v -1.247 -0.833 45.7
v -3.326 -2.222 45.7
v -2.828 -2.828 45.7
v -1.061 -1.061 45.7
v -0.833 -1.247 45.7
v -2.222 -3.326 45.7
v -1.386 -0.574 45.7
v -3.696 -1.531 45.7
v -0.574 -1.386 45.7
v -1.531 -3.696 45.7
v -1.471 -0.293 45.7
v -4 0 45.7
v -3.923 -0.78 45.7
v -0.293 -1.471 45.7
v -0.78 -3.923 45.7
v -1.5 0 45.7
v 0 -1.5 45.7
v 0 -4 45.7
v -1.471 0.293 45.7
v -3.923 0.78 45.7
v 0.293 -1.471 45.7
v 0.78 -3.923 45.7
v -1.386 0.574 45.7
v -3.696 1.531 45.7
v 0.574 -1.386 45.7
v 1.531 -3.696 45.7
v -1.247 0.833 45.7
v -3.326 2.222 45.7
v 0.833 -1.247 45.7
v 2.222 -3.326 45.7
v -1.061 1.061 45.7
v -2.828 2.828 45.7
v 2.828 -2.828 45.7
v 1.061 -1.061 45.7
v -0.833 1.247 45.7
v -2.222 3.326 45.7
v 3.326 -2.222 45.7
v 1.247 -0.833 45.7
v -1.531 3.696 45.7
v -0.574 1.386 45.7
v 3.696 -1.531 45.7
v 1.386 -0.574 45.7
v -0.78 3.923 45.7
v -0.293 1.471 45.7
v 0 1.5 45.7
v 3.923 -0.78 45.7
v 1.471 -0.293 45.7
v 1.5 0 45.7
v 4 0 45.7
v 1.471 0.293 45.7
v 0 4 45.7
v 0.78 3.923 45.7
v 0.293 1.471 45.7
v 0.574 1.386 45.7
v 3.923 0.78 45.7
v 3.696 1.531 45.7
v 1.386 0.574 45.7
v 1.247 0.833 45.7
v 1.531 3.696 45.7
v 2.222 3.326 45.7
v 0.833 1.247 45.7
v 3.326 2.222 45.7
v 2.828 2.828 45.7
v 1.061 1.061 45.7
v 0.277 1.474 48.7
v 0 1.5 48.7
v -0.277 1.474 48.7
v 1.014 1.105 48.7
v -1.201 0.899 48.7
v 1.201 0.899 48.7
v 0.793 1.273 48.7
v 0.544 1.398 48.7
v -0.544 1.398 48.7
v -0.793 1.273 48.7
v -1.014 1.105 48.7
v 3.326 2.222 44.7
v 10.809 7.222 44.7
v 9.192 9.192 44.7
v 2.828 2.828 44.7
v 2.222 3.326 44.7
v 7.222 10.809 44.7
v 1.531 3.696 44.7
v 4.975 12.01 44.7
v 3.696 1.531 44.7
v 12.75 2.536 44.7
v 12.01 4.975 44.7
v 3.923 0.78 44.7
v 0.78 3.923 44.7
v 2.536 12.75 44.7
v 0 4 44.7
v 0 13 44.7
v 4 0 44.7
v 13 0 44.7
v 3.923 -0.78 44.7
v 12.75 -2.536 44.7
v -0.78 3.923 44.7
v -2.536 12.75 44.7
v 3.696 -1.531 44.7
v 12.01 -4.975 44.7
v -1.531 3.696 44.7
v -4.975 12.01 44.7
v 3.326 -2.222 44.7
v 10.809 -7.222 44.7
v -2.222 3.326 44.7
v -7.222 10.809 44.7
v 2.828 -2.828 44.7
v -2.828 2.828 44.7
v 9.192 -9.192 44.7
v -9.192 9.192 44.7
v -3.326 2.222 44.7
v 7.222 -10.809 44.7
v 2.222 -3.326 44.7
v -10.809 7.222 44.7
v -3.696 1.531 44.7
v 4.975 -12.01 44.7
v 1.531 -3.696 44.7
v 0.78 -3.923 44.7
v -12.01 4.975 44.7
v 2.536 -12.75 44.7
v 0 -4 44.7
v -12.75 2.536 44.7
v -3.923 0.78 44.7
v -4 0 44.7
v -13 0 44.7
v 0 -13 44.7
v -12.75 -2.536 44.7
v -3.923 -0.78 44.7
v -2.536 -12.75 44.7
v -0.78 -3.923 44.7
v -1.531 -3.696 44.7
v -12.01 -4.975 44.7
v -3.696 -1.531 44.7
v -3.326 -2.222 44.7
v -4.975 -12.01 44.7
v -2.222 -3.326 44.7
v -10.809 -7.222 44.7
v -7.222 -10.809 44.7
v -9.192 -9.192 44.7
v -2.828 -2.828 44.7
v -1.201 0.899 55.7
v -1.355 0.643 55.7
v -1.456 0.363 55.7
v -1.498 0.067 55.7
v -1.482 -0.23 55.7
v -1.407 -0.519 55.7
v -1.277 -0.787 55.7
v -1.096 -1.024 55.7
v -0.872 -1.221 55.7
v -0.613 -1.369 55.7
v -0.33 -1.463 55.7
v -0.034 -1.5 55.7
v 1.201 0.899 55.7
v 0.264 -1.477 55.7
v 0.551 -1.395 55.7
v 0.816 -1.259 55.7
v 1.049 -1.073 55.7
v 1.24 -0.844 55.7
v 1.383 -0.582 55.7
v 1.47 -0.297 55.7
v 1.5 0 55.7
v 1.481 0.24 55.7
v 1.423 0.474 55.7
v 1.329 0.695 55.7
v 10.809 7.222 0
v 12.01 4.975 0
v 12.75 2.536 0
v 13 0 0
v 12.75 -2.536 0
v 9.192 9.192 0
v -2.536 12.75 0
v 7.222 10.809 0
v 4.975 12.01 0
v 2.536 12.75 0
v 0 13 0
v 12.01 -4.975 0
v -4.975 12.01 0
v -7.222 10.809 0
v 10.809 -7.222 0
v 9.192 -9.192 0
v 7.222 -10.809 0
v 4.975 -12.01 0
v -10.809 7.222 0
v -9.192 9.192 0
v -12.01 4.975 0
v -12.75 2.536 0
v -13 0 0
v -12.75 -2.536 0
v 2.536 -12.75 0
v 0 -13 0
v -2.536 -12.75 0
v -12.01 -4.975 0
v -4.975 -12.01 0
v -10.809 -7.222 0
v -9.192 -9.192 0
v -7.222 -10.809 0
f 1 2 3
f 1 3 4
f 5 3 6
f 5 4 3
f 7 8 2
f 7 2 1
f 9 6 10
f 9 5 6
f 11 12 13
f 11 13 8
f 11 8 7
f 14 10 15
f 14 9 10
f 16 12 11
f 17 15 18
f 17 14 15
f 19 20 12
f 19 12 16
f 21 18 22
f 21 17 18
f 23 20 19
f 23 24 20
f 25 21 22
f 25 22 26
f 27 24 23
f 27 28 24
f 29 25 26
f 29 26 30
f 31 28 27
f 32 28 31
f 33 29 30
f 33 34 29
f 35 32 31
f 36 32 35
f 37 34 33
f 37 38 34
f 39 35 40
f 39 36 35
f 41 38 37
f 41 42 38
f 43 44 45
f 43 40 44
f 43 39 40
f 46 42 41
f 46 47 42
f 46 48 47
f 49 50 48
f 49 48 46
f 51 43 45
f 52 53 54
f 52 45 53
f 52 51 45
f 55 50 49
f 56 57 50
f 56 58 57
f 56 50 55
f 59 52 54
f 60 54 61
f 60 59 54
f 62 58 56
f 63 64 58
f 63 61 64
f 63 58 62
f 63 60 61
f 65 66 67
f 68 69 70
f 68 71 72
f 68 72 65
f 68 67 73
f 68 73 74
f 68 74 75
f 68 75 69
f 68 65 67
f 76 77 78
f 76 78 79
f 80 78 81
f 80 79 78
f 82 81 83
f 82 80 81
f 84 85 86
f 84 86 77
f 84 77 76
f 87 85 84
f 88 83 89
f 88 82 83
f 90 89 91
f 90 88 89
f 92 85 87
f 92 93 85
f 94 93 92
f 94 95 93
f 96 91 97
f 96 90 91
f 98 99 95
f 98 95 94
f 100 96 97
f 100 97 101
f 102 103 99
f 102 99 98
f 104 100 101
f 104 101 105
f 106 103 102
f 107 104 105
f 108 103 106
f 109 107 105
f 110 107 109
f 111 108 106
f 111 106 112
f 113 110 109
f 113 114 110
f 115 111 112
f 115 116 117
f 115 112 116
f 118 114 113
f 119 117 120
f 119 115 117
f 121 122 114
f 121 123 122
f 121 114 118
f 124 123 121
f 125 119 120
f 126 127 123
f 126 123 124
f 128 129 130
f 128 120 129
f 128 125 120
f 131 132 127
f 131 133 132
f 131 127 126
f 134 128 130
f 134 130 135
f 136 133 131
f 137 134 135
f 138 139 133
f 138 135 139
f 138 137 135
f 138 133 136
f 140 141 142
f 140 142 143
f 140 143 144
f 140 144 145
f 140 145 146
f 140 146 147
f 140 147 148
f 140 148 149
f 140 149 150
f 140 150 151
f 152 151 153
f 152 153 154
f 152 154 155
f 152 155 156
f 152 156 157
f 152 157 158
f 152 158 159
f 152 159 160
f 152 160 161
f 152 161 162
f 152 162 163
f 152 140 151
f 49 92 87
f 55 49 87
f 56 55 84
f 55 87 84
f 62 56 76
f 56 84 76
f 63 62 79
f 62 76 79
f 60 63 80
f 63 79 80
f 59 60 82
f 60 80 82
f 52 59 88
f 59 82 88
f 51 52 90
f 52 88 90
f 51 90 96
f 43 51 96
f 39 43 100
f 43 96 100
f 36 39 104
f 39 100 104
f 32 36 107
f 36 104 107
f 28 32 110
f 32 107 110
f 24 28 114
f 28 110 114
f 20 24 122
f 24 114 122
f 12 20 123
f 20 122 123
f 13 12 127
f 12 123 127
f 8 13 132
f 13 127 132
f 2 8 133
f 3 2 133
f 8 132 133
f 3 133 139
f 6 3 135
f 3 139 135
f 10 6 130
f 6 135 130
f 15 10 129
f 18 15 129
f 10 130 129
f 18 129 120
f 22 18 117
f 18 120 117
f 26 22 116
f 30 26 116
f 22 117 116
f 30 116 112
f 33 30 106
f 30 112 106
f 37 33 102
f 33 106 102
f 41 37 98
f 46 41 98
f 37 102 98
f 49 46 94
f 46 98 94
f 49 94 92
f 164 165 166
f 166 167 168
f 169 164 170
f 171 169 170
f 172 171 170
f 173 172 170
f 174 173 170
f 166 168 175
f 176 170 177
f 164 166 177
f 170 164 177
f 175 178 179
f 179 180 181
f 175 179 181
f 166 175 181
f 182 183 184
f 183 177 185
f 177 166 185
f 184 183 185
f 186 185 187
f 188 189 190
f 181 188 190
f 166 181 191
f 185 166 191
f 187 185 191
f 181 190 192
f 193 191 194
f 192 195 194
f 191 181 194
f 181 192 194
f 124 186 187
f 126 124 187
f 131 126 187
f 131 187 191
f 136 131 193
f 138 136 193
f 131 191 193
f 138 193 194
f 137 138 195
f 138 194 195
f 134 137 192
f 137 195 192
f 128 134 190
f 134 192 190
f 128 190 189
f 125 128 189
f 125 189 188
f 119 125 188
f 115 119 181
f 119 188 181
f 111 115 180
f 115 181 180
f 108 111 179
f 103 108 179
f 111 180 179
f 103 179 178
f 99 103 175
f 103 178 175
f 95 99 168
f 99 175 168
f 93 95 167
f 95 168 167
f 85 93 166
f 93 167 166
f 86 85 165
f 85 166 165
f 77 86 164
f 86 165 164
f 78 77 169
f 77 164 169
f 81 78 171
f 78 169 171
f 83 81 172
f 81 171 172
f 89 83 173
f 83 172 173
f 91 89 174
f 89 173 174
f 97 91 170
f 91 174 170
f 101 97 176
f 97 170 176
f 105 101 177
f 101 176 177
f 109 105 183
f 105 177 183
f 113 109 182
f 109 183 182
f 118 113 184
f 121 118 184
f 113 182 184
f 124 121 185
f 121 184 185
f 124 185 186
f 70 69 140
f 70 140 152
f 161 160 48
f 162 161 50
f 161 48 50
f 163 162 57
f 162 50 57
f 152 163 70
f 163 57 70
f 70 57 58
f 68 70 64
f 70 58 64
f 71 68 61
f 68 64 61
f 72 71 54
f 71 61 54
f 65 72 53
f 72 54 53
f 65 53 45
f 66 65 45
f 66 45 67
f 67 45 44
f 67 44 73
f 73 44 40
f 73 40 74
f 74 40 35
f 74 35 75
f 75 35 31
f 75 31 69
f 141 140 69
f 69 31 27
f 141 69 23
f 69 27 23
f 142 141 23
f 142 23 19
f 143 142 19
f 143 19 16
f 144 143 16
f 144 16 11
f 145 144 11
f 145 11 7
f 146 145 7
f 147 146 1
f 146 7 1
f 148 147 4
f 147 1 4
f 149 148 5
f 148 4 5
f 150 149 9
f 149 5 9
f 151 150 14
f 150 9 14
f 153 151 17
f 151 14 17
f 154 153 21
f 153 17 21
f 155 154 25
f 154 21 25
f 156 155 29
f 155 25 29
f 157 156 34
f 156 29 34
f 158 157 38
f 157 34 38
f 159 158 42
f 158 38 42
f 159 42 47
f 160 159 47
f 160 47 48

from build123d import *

# Parameters (mm, degrees)
ESQUISSE1_R             = 13
BOSS_EXTRU_1_DEPTH      = 44.7
ESQUISSE2_R             = 4
BOSS_EXTRU_2_DEPTH      = 1
ESQUISSE3_R             = 1.5
BOSS_EXTRU_3_DEPTH      = 10
ENL_V_START             = -7
ENL_V_MAT_EXTRU_1_DEPTH = 7


with BuildPart() as part:
    # Esquisse1 → Boss.-Extru.1 (new body)
    with BuildSketch(Plane.XY):
        with Locations(Location((0, 0, 0), (0, 0, 180))):
            Circle(ESQUISSE1_R)
    extrude(amount=BOSS_EXTRU_1_DEPTH)

    # Esquisse2 → Boss.-Extru.2 (add)
    with BuildSketch(Plane.XY.offset(44.7)):
        Circle(ESQUISSE2_R)
    extrude(amount=BOSS_EXTRU_2_DEPTH)

    # Esquisse3 → Boss.-Extru.3 (add)
    with BuildSketch(Plane.XY.offset(45.7)):
        Circle(ESQUISSE3_R)
    extrude(amount=BOSS_EXTRU_3_DEPTH)

    # Esquisse4 → Enlèv. mat.-Extru.1 (cut)
    with BuildSketch(Plane.XY.offset(55.7).offset(ENL_V_START)):
        with BuildLine():
            Line((-1.200903118, 0.898794582), (1.200903118, 0.898794582))
            ThreePointArc((1.200903118, 0.898794582), (0, 1.5), (-1.200903118, 0.898794582))
        make_face()
    extrude(amount=ENL_V_MAT_EXTRU_1_DEPTH, mode=Mode.SUBTRACT)


solid = part.part
